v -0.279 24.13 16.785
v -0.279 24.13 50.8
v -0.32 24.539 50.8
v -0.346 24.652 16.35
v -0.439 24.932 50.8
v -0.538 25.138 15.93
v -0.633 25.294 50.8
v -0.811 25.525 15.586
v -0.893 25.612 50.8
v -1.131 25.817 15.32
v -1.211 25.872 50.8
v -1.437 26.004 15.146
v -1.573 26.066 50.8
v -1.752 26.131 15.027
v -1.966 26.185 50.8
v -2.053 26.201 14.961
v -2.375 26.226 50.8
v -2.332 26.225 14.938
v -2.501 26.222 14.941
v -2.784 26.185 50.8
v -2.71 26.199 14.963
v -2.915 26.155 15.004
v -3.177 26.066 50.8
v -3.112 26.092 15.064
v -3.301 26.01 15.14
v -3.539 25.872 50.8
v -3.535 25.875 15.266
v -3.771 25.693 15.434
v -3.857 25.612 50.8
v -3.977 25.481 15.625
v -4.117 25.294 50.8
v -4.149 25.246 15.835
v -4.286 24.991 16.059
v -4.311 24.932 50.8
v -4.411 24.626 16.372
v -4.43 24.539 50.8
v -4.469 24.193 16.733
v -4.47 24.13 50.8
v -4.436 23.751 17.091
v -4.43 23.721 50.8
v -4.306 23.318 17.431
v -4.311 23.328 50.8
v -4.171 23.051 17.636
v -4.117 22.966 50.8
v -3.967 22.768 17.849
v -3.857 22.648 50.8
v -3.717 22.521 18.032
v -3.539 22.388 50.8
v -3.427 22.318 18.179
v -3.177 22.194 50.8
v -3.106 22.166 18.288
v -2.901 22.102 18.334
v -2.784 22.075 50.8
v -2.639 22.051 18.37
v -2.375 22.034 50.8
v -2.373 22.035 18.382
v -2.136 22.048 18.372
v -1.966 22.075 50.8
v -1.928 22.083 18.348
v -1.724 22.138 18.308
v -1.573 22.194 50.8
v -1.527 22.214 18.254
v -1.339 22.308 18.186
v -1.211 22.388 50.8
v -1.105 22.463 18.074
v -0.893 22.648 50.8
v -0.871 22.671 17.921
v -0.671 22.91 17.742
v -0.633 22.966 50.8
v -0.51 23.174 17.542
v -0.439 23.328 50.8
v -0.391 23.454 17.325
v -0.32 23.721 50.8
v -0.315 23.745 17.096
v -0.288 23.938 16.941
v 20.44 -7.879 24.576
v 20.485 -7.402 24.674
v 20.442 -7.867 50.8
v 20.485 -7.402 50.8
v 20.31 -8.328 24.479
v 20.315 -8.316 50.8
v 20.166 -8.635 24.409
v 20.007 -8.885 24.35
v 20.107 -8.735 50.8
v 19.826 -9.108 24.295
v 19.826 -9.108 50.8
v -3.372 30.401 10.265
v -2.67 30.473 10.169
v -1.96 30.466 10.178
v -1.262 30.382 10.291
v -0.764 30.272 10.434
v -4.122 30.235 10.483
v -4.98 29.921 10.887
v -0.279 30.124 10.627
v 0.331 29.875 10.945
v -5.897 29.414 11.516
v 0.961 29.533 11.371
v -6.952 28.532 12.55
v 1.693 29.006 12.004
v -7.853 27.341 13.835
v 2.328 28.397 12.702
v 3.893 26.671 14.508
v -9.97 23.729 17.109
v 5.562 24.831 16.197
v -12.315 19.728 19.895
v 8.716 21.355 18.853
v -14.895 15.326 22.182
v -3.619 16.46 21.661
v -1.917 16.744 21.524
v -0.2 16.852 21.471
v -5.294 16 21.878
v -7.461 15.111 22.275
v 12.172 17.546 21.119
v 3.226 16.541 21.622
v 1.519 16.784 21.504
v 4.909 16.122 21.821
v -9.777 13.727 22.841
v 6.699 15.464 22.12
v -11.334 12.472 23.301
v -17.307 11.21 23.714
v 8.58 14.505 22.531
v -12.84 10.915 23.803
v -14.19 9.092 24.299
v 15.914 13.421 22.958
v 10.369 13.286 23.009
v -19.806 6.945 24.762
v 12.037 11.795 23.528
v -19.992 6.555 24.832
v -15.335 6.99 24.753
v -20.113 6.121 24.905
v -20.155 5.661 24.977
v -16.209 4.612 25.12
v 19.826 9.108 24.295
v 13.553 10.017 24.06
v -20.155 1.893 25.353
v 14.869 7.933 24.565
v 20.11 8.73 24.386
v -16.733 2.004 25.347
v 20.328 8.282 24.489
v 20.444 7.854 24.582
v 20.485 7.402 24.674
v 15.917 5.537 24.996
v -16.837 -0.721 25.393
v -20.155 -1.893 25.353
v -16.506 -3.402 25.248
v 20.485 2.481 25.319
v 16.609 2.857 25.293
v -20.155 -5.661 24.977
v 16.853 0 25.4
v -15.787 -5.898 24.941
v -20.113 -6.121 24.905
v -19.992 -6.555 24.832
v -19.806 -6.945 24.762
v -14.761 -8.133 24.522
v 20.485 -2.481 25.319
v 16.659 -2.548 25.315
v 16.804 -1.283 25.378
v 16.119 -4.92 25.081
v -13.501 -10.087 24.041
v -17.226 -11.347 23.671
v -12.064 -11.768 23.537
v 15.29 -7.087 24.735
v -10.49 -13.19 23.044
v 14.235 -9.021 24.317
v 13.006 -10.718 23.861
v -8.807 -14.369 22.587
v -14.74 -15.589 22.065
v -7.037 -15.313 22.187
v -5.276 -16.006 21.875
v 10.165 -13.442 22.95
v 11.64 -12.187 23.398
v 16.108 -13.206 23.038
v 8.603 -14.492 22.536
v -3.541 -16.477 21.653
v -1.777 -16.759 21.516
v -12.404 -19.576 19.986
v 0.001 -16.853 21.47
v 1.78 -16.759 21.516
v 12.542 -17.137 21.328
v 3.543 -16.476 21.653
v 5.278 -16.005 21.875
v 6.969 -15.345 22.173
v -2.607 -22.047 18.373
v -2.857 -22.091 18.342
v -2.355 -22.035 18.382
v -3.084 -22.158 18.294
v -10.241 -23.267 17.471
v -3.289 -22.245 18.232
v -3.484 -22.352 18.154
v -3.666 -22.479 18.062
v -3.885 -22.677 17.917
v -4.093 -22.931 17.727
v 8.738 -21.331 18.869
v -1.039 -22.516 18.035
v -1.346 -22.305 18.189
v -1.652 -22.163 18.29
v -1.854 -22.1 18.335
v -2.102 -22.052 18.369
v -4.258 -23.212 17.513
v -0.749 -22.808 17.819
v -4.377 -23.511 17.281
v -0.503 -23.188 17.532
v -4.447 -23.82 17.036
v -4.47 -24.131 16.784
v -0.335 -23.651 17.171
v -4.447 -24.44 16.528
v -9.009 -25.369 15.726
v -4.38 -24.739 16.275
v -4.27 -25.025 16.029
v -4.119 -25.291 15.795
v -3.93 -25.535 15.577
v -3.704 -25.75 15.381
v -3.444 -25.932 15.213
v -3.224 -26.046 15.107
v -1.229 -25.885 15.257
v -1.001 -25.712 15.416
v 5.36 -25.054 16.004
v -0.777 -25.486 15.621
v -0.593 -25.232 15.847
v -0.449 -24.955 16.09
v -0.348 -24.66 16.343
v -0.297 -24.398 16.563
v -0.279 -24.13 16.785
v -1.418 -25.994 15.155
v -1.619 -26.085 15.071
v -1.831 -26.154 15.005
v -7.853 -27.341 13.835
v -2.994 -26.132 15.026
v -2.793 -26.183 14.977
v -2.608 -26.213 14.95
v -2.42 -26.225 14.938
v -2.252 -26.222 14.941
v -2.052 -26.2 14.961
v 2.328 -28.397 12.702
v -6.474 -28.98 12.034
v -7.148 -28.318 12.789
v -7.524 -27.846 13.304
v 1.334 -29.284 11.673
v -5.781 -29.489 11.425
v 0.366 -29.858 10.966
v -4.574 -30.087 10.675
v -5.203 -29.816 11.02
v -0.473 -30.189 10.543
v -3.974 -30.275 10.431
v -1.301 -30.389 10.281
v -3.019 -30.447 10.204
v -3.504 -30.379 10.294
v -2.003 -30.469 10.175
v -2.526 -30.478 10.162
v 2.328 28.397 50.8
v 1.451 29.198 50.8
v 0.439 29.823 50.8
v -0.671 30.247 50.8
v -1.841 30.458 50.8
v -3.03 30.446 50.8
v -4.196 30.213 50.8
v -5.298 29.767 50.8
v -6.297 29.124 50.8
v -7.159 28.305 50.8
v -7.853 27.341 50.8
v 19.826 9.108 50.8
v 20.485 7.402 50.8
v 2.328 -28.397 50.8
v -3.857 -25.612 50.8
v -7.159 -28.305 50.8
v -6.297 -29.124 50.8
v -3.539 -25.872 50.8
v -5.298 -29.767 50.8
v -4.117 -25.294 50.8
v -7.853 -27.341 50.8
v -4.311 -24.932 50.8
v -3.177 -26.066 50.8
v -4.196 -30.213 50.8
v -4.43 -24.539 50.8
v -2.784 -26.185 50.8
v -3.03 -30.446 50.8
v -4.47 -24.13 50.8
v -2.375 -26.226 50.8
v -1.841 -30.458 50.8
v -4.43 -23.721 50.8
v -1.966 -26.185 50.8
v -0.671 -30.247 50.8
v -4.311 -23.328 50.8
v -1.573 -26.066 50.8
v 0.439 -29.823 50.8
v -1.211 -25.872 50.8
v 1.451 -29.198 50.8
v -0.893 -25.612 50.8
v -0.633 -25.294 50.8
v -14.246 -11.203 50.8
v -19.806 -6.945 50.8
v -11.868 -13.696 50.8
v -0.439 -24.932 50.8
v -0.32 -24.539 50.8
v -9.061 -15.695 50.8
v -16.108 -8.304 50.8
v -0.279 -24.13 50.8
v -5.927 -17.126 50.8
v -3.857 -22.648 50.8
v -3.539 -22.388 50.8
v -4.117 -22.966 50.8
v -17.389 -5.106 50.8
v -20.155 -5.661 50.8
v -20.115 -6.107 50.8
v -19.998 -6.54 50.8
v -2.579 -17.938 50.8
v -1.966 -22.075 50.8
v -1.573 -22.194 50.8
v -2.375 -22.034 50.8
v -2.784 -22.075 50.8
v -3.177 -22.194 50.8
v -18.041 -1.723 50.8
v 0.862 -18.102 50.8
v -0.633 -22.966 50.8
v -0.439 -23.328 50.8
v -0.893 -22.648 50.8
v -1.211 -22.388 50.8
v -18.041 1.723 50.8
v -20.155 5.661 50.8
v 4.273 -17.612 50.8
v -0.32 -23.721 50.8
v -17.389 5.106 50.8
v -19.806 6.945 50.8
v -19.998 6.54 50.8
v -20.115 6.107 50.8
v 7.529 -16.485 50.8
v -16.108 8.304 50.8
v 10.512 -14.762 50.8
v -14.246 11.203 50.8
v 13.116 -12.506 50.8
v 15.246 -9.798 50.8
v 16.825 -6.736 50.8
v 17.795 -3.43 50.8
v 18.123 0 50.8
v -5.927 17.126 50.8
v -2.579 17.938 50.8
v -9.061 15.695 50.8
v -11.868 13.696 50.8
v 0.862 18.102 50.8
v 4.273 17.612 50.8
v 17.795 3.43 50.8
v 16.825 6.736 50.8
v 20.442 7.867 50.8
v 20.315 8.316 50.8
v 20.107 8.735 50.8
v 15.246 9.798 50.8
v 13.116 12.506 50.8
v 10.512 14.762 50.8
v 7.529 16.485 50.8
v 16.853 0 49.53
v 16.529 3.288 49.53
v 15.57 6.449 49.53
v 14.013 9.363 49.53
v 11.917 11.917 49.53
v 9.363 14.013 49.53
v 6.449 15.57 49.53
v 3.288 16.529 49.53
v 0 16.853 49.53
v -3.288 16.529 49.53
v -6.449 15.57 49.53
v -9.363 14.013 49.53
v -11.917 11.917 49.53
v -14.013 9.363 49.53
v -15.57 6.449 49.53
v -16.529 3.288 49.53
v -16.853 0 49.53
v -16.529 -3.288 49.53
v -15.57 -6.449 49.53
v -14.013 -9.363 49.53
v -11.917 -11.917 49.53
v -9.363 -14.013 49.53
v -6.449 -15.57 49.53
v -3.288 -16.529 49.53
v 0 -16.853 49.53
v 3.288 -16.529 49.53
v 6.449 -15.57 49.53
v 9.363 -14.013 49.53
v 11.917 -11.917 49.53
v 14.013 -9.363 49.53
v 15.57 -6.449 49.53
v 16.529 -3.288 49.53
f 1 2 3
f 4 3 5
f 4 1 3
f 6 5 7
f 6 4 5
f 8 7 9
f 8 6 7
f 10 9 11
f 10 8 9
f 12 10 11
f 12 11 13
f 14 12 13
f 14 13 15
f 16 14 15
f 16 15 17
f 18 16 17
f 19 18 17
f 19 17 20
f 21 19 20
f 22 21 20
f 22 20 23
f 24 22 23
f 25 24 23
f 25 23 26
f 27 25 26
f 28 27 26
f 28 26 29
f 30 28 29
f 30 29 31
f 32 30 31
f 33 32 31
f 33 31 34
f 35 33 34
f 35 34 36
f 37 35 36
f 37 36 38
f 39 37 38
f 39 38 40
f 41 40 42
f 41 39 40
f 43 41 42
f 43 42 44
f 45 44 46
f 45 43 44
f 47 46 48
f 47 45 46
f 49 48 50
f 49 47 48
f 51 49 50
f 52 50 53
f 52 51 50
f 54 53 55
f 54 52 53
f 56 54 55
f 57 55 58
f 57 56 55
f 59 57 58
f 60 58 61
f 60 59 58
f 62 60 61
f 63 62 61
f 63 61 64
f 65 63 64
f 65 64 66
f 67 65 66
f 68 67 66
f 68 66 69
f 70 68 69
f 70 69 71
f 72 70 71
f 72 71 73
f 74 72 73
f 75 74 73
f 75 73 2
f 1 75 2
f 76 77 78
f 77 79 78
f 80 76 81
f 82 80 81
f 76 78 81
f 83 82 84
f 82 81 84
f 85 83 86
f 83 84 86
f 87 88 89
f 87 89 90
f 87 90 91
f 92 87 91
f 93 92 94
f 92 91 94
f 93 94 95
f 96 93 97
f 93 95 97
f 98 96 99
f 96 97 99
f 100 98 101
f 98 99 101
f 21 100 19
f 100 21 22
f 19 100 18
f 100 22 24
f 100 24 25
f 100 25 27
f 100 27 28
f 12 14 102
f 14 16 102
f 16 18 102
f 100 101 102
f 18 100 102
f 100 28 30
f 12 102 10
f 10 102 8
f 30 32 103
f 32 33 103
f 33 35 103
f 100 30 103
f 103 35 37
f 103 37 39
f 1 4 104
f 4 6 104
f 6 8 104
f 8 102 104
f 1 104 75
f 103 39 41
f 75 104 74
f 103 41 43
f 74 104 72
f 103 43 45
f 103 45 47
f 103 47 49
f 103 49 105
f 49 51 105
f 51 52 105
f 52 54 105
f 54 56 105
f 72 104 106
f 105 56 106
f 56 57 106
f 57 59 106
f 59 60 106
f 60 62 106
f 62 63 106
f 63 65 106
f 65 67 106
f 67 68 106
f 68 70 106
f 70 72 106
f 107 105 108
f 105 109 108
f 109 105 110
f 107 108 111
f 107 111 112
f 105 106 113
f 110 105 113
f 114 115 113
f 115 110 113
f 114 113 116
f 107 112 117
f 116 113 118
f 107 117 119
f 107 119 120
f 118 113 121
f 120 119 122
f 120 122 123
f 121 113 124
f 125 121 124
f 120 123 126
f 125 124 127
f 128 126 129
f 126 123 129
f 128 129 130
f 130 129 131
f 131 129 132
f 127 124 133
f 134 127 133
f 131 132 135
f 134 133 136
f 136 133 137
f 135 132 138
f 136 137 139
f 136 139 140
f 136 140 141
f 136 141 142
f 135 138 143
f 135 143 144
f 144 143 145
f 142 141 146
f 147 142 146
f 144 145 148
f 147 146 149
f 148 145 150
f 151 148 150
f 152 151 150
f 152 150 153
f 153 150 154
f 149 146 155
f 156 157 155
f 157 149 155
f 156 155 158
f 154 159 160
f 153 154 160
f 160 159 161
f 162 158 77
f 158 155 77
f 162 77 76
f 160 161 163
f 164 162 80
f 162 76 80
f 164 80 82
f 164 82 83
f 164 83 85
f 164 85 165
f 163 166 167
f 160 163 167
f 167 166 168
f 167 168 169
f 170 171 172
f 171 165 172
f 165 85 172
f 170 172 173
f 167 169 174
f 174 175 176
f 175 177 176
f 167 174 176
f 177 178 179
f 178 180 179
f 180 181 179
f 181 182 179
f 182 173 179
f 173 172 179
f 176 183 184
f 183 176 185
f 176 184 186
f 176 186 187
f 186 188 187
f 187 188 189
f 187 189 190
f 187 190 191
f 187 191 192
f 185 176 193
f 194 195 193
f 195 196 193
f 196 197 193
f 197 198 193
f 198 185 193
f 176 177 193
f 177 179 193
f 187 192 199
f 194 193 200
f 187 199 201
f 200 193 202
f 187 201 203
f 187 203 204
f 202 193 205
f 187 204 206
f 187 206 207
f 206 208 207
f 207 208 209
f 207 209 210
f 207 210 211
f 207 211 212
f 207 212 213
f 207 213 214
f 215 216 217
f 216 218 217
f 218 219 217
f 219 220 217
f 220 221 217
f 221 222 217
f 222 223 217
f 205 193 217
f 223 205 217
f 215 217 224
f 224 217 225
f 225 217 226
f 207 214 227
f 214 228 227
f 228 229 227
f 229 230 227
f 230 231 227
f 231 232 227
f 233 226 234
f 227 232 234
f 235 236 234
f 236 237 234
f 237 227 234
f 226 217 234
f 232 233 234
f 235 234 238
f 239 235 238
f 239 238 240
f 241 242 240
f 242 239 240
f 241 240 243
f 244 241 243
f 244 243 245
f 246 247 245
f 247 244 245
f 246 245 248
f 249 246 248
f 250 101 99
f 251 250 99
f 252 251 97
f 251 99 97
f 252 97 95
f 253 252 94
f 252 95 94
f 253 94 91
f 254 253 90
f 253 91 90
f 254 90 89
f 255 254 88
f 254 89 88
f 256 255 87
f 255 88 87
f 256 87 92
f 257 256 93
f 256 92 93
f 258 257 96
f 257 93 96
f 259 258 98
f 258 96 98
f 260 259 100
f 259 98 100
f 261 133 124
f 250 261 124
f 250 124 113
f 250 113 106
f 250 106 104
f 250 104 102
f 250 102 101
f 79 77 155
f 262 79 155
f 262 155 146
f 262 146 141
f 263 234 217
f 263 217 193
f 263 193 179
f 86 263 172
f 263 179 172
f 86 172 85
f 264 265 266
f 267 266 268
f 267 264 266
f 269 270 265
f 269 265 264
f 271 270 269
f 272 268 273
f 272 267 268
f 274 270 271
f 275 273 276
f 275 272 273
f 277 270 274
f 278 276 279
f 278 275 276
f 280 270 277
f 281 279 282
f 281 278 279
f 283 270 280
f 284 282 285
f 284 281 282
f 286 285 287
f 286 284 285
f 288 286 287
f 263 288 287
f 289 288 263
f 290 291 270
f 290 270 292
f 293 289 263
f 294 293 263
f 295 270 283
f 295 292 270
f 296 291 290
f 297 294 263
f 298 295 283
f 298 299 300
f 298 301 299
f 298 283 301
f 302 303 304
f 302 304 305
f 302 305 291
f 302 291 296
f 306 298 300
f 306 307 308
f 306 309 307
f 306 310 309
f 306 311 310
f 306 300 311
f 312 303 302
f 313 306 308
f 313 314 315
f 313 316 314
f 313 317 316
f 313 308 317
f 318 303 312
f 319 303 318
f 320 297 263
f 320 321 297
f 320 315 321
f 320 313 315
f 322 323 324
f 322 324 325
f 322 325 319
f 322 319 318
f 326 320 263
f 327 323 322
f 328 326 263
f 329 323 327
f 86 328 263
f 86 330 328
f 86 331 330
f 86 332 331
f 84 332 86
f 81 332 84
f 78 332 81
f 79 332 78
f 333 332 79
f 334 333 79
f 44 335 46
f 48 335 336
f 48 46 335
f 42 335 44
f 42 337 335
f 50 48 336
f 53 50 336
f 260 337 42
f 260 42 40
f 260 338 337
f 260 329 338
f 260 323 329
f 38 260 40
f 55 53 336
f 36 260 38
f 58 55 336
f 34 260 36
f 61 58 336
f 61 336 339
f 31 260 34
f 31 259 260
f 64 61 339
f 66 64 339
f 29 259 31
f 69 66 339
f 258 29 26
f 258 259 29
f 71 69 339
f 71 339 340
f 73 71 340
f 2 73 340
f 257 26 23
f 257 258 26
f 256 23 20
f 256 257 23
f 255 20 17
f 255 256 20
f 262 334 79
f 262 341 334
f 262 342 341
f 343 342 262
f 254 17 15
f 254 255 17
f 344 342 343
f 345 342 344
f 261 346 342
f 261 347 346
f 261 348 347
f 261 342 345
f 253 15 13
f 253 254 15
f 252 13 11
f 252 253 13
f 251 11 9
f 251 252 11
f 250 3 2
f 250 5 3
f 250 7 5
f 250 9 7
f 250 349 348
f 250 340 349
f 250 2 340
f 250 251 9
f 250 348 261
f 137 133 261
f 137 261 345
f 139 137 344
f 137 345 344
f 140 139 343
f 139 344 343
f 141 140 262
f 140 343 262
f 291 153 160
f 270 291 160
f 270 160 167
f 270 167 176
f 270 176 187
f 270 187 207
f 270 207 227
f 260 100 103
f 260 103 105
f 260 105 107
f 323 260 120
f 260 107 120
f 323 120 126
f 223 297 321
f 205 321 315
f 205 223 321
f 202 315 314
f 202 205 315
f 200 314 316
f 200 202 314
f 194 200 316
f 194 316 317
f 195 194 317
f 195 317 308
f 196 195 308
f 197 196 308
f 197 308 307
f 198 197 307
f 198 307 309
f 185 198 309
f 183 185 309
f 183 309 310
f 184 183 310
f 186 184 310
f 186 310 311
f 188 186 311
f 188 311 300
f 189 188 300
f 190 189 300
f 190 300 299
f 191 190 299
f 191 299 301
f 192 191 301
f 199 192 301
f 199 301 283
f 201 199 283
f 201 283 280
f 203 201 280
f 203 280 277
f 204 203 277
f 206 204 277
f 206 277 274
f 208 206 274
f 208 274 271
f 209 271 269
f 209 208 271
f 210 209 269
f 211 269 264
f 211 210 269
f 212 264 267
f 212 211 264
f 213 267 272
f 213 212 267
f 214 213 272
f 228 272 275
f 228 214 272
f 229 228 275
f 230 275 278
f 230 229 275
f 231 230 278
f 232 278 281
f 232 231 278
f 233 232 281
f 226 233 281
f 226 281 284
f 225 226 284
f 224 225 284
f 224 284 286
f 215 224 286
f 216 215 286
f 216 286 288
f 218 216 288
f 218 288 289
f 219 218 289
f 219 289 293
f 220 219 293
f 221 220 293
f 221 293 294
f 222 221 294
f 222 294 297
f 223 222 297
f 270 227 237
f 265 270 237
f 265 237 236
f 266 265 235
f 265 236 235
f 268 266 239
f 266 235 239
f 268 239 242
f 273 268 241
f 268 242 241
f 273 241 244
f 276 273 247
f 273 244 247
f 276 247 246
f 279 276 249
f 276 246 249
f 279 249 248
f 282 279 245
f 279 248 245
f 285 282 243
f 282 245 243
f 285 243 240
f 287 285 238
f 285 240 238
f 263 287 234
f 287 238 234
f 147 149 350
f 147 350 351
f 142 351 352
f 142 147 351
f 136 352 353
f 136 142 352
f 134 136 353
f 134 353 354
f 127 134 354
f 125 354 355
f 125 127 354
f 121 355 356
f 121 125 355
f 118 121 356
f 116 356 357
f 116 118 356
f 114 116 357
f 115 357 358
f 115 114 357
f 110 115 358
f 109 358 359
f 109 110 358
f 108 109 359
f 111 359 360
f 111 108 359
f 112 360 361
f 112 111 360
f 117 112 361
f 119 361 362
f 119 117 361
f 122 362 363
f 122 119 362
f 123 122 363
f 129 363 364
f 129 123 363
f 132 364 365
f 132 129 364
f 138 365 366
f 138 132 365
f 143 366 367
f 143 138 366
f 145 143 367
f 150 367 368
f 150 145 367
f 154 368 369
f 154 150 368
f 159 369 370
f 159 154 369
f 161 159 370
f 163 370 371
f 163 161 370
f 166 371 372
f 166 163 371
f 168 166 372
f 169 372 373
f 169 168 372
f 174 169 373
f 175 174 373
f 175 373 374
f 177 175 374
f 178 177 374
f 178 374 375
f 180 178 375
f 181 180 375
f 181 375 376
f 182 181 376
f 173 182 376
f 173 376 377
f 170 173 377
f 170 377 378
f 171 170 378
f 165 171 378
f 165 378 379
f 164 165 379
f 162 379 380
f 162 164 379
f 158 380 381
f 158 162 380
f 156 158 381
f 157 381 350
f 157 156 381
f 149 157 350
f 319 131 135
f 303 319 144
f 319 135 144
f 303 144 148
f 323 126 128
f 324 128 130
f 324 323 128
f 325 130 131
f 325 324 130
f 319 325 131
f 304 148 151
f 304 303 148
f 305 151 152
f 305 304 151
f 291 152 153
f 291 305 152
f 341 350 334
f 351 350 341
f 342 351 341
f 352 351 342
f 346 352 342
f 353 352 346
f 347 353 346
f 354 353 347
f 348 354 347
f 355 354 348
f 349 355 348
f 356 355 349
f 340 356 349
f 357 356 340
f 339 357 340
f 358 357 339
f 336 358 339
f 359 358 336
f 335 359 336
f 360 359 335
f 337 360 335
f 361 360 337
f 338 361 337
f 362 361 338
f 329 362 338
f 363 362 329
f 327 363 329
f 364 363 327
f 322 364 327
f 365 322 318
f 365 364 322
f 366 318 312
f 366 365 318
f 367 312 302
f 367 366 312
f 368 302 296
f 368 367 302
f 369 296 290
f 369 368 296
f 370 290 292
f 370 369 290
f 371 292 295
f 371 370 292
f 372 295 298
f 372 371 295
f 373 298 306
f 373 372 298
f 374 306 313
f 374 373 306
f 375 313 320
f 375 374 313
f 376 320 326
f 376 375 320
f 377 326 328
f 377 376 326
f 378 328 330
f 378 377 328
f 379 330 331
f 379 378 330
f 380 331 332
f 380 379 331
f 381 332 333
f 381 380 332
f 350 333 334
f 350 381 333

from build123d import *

# Parameters (mm, degrees)
F0_R          = 2.0955
F0_R_2        = 16.8529
F1_DEPTH      = 50.8
F2_R          = 38.1
F3_DEPTH      = 73.152
F3_DEPTH_BACK = 54.61
F4_SIZE       = 1.27
F5_R          = 2.54


with BuildPart() as f1:
    # F0 (on Top) → F1 (new body)
    with BuildSketch(Plane.XY):
        with BuildLine():
            Line((-7.8534178495, 27.3406607066), (-20.1549, 6.35))
            Line((-20.1549, 6.35), (-20.1549, -6.35))
            Line((-20.1549, -6.35), (-7.8534178495, -27.3406607066))
            ThreePointArc((-7.8534178495, -27.3406607066), (-3.0299265704, -30.4461254098), (2.328177165, -28.3965636266))
            Line((2.328177165, -28.3965636266), (20.4851, -8.382))
            Line((20.4851, -8.382), (20.4851, 8.382))
            Line((20.4851, 8.382), (2.328177165, 28.3965636266))
            ThreePointArc((2.328177165, 28.3965636266), (-3.0299265704, 30.4461254098), (-7.8534178495, 27.3406607066))
        make_face()
        with Locations((-2.3749, -24.13)):
            Circle(F0_R, mode=Mode.SUBTRACT)
        Circle(F0_R_2, mode=Mode.SUBTRACT)
        with Locations((-2.3749, 24.13)):
            Circle(F0_R, mode=Mode.SUBTRACT)
    extrude(amount=F1_DEPTH)

    # F2 (on Right) → F3 (cut, two sides)
    with BuildSketch(Plane.YZ) as f3_sk:
        with Locations((0, -12.7)):
            Circle(F2_R)
    extrude(amount=-F3_DEPTH, mode=Mode.SUBTRACT)
    extrude(f3_sk.sketch, amount=F3_DEPTH_BACK, mode=Mode.SUBTRACT)

    # F4
    f4_edges = [f1.edges().sort_by_distance(p)[0] for p in [
        (-16.8529, 0, 50.8),
    ]]
    chamfer(f4_edges, length=F4_SIZE)

    # F5
    f5_edges = [f1.edges().sort_by_distance(p)[0] for p in [
        (20.4851, 8.382, 37.633273),
        (-20.1549, 6.35, 37.833553),
        (-20.1549, -6.35, 37.833553),
        (20.4851, -8.382, 37.633273),
    ]]
    fillet(f5_edges, radius=F5_R)


solid = f1.part
